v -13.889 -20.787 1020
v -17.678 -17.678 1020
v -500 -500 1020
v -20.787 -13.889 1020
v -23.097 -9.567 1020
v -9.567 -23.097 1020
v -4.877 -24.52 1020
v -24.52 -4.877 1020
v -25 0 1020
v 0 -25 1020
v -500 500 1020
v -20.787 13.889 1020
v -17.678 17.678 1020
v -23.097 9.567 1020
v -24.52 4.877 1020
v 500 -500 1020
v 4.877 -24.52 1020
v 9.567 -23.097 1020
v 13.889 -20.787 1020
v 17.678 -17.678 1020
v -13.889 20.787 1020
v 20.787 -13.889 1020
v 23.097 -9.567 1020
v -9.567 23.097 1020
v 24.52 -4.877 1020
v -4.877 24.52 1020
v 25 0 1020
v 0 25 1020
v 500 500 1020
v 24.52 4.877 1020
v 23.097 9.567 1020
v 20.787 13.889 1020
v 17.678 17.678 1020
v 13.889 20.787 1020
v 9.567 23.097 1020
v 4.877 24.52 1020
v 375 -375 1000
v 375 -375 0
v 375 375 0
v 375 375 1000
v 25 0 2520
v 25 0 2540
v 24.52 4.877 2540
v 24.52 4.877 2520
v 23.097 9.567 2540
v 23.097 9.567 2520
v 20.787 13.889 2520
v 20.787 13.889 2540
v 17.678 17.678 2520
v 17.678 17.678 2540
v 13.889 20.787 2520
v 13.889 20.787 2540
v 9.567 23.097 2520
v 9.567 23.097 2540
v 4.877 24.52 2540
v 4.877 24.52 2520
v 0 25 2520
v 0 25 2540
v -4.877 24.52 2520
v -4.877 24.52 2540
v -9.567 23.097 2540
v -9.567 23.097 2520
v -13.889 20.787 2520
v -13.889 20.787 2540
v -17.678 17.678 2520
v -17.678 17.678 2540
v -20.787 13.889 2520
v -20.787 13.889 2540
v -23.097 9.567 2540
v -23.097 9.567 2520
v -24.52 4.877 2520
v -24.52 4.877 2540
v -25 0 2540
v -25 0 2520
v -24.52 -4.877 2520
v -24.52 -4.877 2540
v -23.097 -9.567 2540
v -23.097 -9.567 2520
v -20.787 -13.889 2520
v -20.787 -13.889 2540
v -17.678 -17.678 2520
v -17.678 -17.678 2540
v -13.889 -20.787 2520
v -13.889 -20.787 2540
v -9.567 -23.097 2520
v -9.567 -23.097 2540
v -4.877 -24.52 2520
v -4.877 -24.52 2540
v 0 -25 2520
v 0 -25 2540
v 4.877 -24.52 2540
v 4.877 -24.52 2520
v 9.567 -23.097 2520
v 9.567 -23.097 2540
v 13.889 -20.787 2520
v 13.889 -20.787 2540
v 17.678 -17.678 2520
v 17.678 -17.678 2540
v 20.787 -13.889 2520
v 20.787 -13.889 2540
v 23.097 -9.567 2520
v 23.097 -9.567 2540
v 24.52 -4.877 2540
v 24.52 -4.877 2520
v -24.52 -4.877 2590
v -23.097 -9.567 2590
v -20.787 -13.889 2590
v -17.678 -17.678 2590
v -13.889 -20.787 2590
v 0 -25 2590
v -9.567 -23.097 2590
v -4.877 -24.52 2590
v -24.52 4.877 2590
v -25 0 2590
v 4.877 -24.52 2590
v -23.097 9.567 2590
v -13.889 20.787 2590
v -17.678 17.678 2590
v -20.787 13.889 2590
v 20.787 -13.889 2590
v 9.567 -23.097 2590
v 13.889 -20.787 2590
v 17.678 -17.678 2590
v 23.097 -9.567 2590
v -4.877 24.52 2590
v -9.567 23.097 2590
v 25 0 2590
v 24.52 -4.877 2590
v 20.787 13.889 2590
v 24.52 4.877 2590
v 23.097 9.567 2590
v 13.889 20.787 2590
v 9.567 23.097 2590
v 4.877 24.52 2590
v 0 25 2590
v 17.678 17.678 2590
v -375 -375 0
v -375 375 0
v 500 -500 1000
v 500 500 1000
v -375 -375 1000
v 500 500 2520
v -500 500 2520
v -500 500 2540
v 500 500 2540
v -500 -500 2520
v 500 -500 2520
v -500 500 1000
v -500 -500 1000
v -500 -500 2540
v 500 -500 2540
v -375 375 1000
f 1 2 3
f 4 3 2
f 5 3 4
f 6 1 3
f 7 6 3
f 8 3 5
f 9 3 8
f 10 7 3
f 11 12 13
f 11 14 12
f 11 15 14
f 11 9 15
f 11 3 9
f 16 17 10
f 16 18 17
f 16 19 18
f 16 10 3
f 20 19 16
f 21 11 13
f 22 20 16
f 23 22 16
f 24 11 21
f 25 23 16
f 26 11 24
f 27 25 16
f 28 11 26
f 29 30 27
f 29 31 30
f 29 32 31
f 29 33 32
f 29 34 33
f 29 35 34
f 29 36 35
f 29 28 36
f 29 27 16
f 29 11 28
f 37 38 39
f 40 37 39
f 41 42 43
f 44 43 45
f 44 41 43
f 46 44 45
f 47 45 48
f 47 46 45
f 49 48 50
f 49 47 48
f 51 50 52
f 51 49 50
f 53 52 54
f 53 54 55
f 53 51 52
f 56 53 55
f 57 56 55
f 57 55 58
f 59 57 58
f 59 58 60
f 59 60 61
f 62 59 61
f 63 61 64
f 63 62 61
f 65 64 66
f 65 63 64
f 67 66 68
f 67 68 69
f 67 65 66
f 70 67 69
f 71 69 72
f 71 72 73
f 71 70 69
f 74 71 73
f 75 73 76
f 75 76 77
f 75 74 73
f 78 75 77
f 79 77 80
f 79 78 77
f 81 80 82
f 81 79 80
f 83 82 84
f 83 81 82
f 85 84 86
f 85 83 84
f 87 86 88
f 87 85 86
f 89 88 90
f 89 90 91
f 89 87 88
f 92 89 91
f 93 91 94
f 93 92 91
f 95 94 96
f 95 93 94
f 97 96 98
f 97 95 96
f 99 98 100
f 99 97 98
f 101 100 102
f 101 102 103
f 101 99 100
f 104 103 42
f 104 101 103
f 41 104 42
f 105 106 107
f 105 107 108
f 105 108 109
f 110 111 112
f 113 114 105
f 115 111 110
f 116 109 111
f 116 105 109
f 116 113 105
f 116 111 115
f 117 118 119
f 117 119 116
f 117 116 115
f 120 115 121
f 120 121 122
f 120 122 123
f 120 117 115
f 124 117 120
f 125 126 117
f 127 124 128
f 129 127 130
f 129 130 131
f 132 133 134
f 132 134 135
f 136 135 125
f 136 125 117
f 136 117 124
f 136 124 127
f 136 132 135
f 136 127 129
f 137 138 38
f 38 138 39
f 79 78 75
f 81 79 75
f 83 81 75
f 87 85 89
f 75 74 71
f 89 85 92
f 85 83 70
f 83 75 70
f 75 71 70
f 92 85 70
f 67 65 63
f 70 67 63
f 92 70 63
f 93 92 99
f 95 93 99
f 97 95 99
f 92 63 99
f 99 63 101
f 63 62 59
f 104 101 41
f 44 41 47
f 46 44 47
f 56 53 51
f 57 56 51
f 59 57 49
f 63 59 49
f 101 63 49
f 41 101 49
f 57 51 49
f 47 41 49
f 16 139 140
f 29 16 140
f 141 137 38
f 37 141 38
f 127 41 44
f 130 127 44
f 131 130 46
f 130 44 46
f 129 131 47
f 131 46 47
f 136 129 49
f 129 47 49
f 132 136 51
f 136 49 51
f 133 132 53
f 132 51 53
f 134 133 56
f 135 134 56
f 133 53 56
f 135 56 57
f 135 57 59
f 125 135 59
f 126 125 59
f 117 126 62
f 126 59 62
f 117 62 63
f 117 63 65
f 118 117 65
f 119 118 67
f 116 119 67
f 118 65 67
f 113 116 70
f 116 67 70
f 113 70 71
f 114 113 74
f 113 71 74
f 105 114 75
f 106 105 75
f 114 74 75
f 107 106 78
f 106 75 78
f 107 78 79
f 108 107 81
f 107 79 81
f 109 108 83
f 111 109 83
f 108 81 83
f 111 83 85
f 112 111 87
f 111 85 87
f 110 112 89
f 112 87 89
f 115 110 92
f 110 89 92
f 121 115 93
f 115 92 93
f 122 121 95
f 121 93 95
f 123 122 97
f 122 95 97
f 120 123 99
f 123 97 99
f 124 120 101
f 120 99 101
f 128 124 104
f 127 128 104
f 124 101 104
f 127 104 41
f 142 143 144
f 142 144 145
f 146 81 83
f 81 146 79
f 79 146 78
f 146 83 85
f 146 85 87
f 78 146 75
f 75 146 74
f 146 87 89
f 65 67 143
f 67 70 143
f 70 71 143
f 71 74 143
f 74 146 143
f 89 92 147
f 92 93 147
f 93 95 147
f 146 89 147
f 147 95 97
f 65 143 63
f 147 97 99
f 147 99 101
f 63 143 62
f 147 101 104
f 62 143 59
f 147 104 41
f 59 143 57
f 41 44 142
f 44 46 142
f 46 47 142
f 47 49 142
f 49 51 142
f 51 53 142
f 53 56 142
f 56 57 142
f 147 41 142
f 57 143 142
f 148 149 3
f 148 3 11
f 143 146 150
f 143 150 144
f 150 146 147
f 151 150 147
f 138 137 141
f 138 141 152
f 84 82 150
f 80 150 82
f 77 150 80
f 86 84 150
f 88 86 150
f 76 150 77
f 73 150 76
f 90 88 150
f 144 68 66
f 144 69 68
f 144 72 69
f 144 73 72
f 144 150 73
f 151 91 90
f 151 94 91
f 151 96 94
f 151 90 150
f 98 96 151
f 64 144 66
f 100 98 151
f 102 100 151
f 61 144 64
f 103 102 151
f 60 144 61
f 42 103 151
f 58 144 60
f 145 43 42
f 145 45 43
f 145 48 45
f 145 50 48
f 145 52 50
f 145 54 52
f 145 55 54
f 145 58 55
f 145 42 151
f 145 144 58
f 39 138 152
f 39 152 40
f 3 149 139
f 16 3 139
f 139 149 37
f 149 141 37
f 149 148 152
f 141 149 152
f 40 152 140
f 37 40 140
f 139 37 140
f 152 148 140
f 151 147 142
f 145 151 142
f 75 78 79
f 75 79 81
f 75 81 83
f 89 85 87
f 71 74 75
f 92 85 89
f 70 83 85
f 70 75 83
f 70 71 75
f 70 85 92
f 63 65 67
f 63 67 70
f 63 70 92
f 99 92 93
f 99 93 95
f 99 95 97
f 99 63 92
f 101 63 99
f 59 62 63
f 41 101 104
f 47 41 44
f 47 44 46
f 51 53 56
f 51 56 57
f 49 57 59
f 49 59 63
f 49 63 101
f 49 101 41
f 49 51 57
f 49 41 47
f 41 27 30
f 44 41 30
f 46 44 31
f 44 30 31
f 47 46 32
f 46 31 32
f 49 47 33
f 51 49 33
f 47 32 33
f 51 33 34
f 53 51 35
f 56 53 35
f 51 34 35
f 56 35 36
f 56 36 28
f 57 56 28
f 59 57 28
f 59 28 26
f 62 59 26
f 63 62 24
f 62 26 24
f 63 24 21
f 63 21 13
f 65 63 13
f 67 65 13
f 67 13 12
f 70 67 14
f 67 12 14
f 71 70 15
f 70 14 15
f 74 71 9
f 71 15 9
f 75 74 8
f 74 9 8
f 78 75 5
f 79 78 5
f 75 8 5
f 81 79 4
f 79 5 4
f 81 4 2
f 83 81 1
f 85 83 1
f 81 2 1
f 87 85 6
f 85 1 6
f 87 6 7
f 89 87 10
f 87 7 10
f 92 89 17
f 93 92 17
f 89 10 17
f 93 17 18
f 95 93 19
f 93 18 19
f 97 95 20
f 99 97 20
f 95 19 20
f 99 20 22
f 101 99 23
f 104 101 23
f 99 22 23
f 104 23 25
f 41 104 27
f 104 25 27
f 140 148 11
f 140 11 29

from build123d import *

# Parameters (mm, degrees)
F0_W     = 750
F0_H     = 750
F1_DEPTH = 1000
F2_W     = 1000
F2_H     = 1000
F2_W_2   = 750
F2_H_2   = 750
F3_DEPTH = 20
F4_R     = 25
F5_DEPTH = 1500
F6_W     = 1000
F6_H     = 1000
F6_R     = 25
F7_DEPTH = 20
F8_R     = 25
F9_DEPTH = 70


with BuildPart() as f1:
    # F0 (on Top) → F1 (new body)
    with BuildSketch(Plane.XY):
        Rectangle(F0_W, F0_H)
    extrude(amount=F1_DEPTH)

    # F2 (on face) → F3 (join)
    with BuildSketch(Plane.XY.offset(1000)):
        Rectangle(F2_W, F2_H)
        Rectangle(F2_W_2, F2_H_2, mode=Mode.SUBTRACT)
        Rectangle(F2_W_2, F2_H_2)
        Rectangle(F2_W, F2_H)
    extrude(amount=F3_DEPTH)

    # F4 (on face) → F5 (join)
    with BuildSketch(Plane.XY.offset(1020)):
        Circle(F4_R)
    extrude(amount=F5_DEPTH)


with BuildPart() as f7:
    # F6 (on face) → F7 (new body)
    with BuildSketch(Plane.XY.offset(2520)):
        Rectangle(F6_W, F6_H)
        Circle(F6_R, mode=Mode.SUBTRACT)
    extrude(amount=F7_DEPTH)


with BuildPart() as f9:
    # F8 (on face) → F9 (new body)
    with BuildSketch(Plane.XY.offset(2520)):
        Circle(F8_R)
    extrude(amount=F9_DEPTH)


solid = Compound([f1.part, f7.part, f9.part])
